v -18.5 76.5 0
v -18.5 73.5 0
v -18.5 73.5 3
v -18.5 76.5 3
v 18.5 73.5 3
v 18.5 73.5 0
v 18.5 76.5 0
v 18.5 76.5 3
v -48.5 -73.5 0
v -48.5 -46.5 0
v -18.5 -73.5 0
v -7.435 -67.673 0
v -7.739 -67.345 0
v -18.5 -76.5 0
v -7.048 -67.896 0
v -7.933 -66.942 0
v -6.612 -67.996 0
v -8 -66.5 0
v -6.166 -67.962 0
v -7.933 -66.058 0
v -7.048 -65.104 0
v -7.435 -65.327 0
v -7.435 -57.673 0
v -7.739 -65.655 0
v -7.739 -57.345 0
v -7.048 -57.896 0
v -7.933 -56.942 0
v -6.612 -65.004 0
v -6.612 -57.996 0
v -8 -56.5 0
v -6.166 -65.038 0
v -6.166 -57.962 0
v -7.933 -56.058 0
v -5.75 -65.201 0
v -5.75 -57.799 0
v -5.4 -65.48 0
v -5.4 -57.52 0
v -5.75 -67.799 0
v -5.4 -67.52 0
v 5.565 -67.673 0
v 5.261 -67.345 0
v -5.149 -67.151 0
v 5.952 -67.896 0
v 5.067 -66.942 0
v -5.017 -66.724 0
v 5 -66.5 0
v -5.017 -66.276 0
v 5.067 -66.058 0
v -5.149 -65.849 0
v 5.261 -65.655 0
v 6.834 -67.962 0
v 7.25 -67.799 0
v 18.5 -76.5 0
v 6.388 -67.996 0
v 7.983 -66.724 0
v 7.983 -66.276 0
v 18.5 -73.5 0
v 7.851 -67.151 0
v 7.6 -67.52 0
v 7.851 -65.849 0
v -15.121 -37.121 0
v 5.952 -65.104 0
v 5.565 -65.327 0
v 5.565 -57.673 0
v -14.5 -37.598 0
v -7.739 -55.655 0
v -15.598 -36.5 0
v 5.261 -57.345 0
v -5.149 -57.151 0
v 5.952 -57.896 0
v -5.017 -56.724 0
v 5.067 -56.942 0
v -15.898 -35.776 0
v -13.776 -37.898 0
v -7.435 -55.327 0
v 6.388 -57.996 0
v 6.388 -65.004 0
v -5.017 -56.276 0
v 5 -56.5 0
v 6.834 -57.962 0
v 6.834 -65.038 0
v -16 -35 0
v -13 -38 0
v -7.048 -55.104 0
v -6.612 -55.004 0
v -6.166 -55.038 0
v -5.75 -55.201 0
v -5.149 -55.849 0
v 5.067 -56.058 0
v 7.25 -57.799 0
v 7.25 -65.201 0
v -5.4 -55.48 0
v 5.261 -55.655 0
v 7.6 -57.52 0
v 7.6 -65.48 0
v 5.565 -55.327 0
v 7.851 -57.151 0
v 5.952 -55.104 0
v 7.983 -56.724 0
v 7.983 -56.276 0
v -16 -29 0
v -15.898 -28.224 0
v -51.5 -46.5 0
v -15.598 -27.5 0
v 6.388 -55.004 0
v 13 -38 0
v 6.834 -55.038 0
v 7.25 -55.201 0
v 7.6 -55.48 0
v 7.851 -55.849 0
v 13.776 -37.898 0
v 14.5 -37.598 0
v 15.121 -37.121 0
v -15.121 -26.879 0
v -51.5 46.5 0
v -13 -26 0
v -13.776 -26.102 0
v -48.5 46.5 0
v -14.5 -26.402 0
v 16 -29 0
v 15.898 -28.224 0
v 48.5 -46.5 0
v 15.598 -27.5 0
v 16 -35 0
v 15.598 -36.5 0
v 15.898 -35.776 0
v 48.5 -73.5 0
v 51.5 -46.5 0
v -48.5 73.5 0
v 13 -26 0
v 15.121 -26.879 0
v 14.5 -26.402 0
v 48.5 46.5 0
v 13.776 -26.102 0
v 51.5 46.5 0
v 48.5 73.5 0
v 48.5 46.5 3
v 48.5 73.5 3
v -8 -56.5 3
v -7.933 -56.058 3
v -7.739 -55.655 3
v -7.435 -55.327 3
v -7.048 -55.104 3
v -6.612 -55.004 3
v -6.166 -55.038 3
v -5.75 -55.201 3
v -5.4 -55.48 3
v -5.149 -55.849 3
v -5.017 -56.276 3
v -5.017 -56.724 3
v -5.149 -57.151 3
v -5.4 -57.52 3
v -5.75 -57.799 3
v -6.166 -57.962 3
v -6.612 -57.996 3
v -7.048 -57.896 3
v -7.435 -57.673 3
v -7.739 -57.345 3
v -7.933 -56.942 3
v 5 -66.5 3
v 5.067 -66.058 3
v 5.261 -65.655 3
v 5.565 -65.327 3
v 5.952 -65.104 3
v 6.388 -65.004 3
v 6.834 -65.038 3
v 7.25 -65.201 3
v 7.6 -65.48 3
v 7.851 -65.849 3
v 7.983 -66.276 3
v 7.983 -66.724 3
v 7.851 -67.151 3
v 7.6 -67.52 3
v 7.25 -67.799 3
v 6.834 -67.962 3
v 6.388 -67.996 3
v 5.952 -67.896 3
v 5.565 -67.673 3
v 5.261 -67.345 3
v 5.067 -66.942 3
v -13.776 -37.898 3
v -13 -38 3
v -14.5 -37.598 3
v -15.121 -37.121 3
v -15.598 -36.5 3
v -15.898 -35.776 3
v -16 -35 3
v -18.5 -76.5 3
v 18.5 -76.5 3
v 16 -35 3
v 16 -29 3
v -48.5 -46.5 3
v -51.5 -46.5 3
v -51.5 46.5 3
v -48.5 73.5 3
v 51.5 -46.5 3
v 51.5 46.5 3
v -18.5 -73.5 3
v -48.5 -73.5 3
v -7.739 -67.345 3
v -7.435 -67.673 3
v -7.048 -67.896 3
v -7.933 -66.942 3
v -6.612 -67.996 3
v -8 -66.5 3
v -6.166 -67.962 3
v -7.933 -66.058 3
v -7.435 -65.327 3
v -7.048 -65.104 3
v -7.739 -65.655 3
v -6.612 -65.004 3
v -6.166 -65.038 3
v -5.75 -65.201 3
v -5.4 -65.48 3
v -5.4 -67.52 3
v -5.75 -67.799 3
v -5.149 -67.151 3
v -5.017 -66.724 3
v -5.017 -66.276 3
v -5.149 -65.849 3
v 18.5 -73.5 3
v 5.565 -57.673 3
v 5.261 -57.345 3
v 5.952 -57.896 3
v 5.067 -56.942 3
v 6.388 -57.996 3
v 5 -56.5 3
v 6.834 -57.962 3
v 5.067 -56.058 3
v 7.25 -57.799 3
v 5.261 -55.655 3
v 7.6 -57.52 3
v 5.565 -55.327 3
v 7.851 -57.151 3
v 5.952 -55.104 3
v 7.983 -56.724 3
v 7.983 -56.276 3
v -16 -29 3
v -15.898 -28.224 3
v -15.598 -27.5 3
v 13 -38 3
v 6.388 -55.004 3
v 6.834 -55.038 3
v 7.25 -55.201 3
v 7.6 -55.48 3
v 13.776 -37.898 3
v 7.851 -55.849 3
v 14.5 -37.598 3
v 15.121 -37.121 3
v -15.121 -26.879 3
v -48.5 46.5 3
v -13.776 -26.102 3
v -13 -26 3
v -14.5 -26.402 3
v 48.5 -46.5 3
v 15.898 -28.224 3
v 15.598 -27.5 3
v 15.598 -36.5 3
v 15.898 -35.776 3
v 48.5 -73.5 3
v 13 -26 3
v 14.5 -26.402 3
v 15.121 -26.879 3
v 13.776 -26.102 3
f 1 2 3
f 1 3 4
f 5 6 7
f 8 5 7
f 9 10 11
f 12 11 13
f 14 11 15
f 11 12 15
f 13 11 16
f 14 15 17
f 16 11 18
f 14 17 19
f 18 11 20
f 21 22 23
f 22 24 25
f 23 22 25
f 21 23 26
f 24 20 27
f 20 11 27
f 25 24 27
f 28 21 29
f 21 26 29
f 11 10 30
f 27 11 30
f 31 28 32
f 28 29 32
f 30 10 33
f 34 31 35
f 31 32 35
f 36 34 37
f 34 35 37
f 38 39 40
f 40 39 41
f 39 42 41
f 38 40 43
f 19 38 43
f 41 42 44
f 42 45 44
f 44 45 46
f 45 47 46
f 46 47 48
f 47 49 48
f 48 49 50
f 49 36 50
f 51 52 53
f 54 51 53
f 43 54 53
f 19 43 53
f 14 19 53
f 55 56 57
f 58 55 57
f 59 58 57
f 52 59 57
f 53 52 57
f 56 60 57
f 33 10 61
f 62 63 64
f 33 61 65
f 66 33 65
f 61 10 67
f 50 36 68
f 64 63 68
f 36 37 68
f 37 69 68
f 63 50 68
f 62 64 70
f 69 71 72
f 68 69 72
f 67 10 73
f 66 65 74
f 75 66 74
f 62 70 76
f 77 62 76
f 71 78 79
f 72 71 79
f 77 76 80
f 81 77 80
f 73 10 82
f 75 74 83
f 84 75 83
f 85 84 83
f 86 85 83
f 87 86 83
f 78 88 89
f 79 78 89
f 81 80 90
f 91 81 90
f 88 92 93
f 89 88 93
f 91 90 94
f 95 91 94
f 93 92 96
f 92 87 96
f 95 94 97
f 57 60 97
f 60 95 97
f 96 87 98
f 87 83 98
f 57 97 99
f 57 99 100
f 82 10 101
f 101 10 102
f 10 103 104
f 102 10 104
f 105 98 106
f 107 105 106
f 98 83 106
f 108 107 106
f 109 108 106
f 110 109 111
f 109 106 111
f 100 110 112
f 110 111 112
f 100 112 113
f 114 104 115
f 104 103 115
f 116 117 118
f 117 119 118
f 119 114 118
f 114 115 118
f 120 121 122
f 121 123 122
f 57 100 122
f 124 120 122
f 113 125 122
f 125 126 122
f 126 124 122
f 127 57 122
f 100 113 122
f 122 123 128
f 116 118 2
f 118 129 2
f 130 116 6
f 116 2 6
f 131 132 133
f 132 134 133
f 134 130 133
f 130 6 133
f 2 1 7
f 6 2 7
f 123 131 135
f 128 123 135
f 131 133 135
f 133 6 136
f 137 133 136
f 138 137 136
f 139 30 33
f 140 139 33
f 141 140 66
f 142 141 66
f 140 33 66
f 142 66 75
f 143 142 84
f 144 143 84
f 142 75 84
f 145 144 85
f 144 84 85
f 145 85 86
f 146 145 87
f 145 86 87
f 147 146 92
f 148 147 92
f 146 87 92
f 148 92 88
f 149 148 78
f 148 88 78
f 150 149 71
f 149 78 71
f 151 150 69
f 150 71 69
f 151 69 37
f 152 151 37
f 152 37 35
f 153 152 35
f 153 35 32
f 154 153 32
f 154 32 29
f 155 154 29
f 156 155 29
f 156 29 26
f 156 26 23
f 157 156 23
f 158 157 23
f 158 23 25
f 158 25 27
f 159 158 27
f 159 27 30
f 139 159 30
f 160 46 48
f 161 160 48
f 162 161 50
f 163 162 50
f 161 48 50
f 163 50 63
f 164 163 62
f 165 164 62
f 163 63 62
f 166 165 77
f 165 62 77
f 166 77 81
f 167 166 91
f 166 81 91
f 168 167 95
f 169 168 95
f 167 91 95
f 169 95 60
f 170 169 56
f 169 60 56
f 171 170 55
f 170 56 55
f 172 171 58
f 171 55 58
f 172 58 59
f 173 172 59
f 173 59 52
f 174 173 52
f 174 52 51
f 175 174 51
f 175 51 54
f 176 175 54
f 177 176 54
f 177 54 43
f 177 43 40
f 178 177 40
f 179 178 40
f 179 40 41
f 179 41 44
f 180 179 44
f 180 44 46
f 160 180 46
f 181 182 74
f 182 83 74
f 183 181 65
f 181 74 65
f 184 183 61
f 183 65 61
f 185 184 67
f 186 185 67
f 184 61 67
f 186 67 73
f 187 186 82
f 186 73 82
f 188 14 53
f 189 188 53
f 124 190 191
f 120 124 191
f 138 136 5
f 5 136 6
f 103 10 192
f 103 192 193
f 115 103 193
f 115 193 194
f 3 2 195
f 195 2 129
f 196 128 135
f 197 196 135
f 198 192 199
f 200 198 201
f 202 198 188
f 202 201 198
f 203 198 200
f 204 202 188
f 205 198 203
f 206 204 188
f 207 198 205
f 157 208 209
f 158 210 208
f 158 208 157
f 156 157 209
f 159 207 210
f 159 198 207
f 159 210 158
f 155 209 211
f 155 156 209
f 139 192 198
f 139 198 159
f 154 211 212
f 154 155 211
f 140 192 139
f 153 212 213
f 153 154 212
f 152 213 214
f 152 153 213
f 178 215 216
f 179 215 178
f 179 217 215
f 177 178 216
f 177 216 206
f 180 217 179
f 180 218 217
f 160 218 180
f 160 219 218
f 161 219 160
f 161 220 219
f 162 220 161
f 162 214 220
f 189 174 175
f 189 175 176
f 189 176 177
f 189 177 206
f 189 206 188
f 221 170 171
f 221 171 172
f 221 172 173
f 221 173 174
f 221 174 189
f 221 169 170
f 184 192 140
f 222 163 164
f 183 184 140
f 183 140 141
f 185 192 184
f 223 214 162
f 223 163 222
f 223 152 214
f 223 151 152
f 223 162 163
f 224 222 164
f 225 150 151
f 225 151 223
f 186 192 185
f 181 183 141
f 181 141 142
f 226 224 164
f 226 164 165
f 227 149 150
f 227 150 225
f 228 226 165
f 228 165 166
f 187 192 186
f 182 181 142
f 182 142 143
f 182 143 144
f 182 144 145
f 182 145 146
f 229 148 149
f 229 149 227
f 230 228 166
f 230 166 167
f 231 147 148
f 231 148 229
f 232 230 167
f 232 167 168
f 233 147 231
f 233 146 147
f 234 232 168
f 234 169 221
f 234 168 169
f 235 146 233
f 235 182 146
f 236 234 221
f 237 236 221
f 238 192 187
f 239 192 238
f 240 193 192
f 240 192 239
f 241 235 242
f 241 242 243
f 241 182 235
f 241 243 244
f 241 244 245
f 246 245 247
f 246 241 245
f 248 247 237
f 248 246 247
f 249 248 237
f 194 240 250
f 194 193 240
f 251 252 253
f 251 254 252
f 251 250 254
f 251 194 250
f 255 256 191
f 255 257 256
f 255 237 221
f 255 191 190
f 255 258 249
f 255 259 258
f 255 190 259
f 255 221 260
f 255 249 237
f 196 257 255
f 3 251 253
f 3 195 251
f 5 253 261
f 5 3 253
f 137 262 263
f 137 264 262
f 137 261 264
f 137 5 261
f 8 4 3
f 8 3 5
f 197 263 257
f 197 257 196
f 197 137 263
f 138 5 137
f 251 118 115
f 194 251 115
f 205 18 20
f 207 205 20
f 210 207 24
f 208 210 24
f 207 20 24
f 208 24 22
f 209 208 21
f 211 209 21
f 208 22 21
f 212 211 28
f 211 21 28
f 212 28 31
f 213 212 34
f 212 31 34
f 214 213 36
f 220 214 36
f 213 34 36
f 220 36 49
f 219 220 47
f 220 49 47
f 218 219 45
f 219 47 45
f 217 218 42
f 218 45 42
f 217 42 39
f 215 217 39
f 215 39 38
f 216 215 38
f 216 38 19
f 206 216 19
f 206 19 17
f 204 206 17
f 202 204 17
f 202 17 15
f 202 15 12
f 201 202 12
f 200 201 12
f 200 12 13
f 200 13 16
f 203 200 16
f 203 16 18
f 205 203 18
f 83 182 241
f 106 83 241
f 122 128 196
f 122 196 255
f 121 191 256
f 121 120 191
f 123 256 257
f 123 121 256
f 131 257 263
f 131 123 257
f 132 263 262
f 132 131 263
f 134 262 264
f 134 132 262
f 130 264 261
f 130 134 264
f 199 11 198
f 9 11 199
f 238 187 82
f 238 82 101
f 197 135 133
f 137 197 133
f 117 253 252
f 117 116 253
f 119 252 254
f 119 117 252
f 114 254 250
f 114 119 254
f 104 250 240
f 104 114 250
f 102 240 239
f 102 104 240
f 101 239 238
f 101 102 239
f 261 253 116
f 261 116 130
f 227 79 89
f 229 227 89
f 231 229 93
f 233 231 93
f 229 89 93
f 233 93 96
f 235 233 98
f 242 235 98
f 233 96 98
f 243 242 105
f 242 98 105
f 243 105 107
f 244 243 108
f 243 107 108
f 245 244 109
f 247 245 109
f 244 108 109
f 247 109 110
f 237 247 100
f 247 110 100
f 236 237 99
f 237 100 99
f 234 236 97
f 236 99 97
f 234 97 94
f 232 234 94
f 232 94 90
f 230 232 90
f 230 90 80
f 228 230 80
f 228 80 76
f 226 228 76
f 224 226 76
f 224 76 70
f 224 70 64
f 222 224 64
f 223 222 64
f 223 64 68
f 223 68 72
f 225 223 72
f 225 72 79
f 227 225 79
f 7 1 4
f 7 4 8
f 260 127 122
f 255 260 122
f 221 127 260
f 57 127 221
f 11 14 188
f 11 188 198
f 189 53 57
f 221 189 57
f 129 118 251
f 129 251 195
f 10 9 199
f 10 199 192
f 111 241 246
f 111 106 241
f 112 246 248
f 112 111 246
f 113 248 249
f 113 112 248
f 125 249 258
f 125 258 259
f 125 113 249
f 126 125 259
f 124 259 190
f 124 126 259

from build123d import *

# Parameters (mm, degrees)
ESBO_O1_W                = 103
ESBO_O1_H                = 153
RESSALTO_EXTRUS_O1_DEPTH = 3
ESBO_O2_W                = 32
ESBO_O2_H                = 12
CORTE_EXTRUS_O1_DEPTH    = 93.268629555
FILETE1_R                = 3
ESBO_O3_W                = 33
ESBO_O3_H                = 3
CORTE_EXTRUS_O2_DEPTH    = 93.268629555
ESBO_O4_W                = 3
ESBO_O4_H                = 27
ESBO_O4_R                = 1.5
CORTE_EXTRUS_O3_DEPTH    = 93.268629555


with BuildPart() as part:
    # Esboço1 → Ressalto-extrusão1 (new body)
    with BuildSketch(Plane.XY):
        Rectangle(ESBO_O1_W, ESBO_O1_H)
    extrude(amount=RESSALTO_EXTRUS_O1_DEPTH)

    # Esboço2 → Corte-extrusão1 (cut, through all)
    with BuildSketch(Plane.XY.offset(3)):
        with Locations((0, -32)):
            Rectangle(ESBO_O2_W, ESBO_O2_H)
    extrude(amount=-CORTE_EXTRUS_O1_DEPTH, mode=Mode.SUBTRACT)

    # Filete1
    filete1_edges = [part.edges().sort_by_distance(p)[0] for p in [
        (16, -26, 1.5),
        (16, -38, 1.5),
        (-16, -38, 1.5),
        (-16, -26, 1.5),
    ]]
    fillet(filete1_edges, radius=FILETE1_R)

    # Esboço3 → Corte-extrusão2 (cut, through all)
    with BuildSketch(Plane(origin=(0, 0, 0), x_dir=(-1, 0, 0), z_dir=(0, 0, -1))):
        with Locations((35, -75)):
            Rectangle(ESBO_O3_W, ESBO_O3_H)
        with Locations((-35, -75)):
            Rectangle(ESBO_O3_W, ESBO_O3_H)
        with Locations((35, 75)):
            Rectangle(ESBO_O3_W, ESBO_O3_H)
        with Locations((-35, 75)):
            Rectangle(ESBO_O3_W, ESBO_O3_H)
    extrude(amount=-CORTE_EXTRUS_O2_DEPTH, mode=Mode.SUBTRACT)

    # Esboço4 → Corte-extrusão3 (cut, through all)
    with BuildSketch(Plane(origin=(0, 0, 0), x_dir=(-1, 0, 0), z_dir=(0, 0, -1))):
        with Locations((50, 60)):
            Rectangle(ESBO_O4_W, ESBO_O4_H)
        with Locations((50, -60)):
            Rectangle(ESBO_O4_W, ESBO_O4_H)
        with Locations((-50, -60)):
            Rectangle(ESBO_O4_W, ESBO_O4_H)
        with Locations((-50, 60)):
            Rectangle(ESBO_O4_W, ESBO_O4_H)
        with Locations((-6.5, -66.5)):
            Circle(ESBO_O4_R)
        with Locations((-6.5, -56.5)):
            Circle(ESBO_O4_R)
        with Locations((6.5, -66.5)):
            Circle(ESBO_O4_R)
        with Locations((6.5, -56.5)):
            Circle(ESBO_O4_R)
    extrude(amount=-CORTE_EXTRUS_O3_DEPTH, mode=Mode.SUBTRACT)


solid = part.part
